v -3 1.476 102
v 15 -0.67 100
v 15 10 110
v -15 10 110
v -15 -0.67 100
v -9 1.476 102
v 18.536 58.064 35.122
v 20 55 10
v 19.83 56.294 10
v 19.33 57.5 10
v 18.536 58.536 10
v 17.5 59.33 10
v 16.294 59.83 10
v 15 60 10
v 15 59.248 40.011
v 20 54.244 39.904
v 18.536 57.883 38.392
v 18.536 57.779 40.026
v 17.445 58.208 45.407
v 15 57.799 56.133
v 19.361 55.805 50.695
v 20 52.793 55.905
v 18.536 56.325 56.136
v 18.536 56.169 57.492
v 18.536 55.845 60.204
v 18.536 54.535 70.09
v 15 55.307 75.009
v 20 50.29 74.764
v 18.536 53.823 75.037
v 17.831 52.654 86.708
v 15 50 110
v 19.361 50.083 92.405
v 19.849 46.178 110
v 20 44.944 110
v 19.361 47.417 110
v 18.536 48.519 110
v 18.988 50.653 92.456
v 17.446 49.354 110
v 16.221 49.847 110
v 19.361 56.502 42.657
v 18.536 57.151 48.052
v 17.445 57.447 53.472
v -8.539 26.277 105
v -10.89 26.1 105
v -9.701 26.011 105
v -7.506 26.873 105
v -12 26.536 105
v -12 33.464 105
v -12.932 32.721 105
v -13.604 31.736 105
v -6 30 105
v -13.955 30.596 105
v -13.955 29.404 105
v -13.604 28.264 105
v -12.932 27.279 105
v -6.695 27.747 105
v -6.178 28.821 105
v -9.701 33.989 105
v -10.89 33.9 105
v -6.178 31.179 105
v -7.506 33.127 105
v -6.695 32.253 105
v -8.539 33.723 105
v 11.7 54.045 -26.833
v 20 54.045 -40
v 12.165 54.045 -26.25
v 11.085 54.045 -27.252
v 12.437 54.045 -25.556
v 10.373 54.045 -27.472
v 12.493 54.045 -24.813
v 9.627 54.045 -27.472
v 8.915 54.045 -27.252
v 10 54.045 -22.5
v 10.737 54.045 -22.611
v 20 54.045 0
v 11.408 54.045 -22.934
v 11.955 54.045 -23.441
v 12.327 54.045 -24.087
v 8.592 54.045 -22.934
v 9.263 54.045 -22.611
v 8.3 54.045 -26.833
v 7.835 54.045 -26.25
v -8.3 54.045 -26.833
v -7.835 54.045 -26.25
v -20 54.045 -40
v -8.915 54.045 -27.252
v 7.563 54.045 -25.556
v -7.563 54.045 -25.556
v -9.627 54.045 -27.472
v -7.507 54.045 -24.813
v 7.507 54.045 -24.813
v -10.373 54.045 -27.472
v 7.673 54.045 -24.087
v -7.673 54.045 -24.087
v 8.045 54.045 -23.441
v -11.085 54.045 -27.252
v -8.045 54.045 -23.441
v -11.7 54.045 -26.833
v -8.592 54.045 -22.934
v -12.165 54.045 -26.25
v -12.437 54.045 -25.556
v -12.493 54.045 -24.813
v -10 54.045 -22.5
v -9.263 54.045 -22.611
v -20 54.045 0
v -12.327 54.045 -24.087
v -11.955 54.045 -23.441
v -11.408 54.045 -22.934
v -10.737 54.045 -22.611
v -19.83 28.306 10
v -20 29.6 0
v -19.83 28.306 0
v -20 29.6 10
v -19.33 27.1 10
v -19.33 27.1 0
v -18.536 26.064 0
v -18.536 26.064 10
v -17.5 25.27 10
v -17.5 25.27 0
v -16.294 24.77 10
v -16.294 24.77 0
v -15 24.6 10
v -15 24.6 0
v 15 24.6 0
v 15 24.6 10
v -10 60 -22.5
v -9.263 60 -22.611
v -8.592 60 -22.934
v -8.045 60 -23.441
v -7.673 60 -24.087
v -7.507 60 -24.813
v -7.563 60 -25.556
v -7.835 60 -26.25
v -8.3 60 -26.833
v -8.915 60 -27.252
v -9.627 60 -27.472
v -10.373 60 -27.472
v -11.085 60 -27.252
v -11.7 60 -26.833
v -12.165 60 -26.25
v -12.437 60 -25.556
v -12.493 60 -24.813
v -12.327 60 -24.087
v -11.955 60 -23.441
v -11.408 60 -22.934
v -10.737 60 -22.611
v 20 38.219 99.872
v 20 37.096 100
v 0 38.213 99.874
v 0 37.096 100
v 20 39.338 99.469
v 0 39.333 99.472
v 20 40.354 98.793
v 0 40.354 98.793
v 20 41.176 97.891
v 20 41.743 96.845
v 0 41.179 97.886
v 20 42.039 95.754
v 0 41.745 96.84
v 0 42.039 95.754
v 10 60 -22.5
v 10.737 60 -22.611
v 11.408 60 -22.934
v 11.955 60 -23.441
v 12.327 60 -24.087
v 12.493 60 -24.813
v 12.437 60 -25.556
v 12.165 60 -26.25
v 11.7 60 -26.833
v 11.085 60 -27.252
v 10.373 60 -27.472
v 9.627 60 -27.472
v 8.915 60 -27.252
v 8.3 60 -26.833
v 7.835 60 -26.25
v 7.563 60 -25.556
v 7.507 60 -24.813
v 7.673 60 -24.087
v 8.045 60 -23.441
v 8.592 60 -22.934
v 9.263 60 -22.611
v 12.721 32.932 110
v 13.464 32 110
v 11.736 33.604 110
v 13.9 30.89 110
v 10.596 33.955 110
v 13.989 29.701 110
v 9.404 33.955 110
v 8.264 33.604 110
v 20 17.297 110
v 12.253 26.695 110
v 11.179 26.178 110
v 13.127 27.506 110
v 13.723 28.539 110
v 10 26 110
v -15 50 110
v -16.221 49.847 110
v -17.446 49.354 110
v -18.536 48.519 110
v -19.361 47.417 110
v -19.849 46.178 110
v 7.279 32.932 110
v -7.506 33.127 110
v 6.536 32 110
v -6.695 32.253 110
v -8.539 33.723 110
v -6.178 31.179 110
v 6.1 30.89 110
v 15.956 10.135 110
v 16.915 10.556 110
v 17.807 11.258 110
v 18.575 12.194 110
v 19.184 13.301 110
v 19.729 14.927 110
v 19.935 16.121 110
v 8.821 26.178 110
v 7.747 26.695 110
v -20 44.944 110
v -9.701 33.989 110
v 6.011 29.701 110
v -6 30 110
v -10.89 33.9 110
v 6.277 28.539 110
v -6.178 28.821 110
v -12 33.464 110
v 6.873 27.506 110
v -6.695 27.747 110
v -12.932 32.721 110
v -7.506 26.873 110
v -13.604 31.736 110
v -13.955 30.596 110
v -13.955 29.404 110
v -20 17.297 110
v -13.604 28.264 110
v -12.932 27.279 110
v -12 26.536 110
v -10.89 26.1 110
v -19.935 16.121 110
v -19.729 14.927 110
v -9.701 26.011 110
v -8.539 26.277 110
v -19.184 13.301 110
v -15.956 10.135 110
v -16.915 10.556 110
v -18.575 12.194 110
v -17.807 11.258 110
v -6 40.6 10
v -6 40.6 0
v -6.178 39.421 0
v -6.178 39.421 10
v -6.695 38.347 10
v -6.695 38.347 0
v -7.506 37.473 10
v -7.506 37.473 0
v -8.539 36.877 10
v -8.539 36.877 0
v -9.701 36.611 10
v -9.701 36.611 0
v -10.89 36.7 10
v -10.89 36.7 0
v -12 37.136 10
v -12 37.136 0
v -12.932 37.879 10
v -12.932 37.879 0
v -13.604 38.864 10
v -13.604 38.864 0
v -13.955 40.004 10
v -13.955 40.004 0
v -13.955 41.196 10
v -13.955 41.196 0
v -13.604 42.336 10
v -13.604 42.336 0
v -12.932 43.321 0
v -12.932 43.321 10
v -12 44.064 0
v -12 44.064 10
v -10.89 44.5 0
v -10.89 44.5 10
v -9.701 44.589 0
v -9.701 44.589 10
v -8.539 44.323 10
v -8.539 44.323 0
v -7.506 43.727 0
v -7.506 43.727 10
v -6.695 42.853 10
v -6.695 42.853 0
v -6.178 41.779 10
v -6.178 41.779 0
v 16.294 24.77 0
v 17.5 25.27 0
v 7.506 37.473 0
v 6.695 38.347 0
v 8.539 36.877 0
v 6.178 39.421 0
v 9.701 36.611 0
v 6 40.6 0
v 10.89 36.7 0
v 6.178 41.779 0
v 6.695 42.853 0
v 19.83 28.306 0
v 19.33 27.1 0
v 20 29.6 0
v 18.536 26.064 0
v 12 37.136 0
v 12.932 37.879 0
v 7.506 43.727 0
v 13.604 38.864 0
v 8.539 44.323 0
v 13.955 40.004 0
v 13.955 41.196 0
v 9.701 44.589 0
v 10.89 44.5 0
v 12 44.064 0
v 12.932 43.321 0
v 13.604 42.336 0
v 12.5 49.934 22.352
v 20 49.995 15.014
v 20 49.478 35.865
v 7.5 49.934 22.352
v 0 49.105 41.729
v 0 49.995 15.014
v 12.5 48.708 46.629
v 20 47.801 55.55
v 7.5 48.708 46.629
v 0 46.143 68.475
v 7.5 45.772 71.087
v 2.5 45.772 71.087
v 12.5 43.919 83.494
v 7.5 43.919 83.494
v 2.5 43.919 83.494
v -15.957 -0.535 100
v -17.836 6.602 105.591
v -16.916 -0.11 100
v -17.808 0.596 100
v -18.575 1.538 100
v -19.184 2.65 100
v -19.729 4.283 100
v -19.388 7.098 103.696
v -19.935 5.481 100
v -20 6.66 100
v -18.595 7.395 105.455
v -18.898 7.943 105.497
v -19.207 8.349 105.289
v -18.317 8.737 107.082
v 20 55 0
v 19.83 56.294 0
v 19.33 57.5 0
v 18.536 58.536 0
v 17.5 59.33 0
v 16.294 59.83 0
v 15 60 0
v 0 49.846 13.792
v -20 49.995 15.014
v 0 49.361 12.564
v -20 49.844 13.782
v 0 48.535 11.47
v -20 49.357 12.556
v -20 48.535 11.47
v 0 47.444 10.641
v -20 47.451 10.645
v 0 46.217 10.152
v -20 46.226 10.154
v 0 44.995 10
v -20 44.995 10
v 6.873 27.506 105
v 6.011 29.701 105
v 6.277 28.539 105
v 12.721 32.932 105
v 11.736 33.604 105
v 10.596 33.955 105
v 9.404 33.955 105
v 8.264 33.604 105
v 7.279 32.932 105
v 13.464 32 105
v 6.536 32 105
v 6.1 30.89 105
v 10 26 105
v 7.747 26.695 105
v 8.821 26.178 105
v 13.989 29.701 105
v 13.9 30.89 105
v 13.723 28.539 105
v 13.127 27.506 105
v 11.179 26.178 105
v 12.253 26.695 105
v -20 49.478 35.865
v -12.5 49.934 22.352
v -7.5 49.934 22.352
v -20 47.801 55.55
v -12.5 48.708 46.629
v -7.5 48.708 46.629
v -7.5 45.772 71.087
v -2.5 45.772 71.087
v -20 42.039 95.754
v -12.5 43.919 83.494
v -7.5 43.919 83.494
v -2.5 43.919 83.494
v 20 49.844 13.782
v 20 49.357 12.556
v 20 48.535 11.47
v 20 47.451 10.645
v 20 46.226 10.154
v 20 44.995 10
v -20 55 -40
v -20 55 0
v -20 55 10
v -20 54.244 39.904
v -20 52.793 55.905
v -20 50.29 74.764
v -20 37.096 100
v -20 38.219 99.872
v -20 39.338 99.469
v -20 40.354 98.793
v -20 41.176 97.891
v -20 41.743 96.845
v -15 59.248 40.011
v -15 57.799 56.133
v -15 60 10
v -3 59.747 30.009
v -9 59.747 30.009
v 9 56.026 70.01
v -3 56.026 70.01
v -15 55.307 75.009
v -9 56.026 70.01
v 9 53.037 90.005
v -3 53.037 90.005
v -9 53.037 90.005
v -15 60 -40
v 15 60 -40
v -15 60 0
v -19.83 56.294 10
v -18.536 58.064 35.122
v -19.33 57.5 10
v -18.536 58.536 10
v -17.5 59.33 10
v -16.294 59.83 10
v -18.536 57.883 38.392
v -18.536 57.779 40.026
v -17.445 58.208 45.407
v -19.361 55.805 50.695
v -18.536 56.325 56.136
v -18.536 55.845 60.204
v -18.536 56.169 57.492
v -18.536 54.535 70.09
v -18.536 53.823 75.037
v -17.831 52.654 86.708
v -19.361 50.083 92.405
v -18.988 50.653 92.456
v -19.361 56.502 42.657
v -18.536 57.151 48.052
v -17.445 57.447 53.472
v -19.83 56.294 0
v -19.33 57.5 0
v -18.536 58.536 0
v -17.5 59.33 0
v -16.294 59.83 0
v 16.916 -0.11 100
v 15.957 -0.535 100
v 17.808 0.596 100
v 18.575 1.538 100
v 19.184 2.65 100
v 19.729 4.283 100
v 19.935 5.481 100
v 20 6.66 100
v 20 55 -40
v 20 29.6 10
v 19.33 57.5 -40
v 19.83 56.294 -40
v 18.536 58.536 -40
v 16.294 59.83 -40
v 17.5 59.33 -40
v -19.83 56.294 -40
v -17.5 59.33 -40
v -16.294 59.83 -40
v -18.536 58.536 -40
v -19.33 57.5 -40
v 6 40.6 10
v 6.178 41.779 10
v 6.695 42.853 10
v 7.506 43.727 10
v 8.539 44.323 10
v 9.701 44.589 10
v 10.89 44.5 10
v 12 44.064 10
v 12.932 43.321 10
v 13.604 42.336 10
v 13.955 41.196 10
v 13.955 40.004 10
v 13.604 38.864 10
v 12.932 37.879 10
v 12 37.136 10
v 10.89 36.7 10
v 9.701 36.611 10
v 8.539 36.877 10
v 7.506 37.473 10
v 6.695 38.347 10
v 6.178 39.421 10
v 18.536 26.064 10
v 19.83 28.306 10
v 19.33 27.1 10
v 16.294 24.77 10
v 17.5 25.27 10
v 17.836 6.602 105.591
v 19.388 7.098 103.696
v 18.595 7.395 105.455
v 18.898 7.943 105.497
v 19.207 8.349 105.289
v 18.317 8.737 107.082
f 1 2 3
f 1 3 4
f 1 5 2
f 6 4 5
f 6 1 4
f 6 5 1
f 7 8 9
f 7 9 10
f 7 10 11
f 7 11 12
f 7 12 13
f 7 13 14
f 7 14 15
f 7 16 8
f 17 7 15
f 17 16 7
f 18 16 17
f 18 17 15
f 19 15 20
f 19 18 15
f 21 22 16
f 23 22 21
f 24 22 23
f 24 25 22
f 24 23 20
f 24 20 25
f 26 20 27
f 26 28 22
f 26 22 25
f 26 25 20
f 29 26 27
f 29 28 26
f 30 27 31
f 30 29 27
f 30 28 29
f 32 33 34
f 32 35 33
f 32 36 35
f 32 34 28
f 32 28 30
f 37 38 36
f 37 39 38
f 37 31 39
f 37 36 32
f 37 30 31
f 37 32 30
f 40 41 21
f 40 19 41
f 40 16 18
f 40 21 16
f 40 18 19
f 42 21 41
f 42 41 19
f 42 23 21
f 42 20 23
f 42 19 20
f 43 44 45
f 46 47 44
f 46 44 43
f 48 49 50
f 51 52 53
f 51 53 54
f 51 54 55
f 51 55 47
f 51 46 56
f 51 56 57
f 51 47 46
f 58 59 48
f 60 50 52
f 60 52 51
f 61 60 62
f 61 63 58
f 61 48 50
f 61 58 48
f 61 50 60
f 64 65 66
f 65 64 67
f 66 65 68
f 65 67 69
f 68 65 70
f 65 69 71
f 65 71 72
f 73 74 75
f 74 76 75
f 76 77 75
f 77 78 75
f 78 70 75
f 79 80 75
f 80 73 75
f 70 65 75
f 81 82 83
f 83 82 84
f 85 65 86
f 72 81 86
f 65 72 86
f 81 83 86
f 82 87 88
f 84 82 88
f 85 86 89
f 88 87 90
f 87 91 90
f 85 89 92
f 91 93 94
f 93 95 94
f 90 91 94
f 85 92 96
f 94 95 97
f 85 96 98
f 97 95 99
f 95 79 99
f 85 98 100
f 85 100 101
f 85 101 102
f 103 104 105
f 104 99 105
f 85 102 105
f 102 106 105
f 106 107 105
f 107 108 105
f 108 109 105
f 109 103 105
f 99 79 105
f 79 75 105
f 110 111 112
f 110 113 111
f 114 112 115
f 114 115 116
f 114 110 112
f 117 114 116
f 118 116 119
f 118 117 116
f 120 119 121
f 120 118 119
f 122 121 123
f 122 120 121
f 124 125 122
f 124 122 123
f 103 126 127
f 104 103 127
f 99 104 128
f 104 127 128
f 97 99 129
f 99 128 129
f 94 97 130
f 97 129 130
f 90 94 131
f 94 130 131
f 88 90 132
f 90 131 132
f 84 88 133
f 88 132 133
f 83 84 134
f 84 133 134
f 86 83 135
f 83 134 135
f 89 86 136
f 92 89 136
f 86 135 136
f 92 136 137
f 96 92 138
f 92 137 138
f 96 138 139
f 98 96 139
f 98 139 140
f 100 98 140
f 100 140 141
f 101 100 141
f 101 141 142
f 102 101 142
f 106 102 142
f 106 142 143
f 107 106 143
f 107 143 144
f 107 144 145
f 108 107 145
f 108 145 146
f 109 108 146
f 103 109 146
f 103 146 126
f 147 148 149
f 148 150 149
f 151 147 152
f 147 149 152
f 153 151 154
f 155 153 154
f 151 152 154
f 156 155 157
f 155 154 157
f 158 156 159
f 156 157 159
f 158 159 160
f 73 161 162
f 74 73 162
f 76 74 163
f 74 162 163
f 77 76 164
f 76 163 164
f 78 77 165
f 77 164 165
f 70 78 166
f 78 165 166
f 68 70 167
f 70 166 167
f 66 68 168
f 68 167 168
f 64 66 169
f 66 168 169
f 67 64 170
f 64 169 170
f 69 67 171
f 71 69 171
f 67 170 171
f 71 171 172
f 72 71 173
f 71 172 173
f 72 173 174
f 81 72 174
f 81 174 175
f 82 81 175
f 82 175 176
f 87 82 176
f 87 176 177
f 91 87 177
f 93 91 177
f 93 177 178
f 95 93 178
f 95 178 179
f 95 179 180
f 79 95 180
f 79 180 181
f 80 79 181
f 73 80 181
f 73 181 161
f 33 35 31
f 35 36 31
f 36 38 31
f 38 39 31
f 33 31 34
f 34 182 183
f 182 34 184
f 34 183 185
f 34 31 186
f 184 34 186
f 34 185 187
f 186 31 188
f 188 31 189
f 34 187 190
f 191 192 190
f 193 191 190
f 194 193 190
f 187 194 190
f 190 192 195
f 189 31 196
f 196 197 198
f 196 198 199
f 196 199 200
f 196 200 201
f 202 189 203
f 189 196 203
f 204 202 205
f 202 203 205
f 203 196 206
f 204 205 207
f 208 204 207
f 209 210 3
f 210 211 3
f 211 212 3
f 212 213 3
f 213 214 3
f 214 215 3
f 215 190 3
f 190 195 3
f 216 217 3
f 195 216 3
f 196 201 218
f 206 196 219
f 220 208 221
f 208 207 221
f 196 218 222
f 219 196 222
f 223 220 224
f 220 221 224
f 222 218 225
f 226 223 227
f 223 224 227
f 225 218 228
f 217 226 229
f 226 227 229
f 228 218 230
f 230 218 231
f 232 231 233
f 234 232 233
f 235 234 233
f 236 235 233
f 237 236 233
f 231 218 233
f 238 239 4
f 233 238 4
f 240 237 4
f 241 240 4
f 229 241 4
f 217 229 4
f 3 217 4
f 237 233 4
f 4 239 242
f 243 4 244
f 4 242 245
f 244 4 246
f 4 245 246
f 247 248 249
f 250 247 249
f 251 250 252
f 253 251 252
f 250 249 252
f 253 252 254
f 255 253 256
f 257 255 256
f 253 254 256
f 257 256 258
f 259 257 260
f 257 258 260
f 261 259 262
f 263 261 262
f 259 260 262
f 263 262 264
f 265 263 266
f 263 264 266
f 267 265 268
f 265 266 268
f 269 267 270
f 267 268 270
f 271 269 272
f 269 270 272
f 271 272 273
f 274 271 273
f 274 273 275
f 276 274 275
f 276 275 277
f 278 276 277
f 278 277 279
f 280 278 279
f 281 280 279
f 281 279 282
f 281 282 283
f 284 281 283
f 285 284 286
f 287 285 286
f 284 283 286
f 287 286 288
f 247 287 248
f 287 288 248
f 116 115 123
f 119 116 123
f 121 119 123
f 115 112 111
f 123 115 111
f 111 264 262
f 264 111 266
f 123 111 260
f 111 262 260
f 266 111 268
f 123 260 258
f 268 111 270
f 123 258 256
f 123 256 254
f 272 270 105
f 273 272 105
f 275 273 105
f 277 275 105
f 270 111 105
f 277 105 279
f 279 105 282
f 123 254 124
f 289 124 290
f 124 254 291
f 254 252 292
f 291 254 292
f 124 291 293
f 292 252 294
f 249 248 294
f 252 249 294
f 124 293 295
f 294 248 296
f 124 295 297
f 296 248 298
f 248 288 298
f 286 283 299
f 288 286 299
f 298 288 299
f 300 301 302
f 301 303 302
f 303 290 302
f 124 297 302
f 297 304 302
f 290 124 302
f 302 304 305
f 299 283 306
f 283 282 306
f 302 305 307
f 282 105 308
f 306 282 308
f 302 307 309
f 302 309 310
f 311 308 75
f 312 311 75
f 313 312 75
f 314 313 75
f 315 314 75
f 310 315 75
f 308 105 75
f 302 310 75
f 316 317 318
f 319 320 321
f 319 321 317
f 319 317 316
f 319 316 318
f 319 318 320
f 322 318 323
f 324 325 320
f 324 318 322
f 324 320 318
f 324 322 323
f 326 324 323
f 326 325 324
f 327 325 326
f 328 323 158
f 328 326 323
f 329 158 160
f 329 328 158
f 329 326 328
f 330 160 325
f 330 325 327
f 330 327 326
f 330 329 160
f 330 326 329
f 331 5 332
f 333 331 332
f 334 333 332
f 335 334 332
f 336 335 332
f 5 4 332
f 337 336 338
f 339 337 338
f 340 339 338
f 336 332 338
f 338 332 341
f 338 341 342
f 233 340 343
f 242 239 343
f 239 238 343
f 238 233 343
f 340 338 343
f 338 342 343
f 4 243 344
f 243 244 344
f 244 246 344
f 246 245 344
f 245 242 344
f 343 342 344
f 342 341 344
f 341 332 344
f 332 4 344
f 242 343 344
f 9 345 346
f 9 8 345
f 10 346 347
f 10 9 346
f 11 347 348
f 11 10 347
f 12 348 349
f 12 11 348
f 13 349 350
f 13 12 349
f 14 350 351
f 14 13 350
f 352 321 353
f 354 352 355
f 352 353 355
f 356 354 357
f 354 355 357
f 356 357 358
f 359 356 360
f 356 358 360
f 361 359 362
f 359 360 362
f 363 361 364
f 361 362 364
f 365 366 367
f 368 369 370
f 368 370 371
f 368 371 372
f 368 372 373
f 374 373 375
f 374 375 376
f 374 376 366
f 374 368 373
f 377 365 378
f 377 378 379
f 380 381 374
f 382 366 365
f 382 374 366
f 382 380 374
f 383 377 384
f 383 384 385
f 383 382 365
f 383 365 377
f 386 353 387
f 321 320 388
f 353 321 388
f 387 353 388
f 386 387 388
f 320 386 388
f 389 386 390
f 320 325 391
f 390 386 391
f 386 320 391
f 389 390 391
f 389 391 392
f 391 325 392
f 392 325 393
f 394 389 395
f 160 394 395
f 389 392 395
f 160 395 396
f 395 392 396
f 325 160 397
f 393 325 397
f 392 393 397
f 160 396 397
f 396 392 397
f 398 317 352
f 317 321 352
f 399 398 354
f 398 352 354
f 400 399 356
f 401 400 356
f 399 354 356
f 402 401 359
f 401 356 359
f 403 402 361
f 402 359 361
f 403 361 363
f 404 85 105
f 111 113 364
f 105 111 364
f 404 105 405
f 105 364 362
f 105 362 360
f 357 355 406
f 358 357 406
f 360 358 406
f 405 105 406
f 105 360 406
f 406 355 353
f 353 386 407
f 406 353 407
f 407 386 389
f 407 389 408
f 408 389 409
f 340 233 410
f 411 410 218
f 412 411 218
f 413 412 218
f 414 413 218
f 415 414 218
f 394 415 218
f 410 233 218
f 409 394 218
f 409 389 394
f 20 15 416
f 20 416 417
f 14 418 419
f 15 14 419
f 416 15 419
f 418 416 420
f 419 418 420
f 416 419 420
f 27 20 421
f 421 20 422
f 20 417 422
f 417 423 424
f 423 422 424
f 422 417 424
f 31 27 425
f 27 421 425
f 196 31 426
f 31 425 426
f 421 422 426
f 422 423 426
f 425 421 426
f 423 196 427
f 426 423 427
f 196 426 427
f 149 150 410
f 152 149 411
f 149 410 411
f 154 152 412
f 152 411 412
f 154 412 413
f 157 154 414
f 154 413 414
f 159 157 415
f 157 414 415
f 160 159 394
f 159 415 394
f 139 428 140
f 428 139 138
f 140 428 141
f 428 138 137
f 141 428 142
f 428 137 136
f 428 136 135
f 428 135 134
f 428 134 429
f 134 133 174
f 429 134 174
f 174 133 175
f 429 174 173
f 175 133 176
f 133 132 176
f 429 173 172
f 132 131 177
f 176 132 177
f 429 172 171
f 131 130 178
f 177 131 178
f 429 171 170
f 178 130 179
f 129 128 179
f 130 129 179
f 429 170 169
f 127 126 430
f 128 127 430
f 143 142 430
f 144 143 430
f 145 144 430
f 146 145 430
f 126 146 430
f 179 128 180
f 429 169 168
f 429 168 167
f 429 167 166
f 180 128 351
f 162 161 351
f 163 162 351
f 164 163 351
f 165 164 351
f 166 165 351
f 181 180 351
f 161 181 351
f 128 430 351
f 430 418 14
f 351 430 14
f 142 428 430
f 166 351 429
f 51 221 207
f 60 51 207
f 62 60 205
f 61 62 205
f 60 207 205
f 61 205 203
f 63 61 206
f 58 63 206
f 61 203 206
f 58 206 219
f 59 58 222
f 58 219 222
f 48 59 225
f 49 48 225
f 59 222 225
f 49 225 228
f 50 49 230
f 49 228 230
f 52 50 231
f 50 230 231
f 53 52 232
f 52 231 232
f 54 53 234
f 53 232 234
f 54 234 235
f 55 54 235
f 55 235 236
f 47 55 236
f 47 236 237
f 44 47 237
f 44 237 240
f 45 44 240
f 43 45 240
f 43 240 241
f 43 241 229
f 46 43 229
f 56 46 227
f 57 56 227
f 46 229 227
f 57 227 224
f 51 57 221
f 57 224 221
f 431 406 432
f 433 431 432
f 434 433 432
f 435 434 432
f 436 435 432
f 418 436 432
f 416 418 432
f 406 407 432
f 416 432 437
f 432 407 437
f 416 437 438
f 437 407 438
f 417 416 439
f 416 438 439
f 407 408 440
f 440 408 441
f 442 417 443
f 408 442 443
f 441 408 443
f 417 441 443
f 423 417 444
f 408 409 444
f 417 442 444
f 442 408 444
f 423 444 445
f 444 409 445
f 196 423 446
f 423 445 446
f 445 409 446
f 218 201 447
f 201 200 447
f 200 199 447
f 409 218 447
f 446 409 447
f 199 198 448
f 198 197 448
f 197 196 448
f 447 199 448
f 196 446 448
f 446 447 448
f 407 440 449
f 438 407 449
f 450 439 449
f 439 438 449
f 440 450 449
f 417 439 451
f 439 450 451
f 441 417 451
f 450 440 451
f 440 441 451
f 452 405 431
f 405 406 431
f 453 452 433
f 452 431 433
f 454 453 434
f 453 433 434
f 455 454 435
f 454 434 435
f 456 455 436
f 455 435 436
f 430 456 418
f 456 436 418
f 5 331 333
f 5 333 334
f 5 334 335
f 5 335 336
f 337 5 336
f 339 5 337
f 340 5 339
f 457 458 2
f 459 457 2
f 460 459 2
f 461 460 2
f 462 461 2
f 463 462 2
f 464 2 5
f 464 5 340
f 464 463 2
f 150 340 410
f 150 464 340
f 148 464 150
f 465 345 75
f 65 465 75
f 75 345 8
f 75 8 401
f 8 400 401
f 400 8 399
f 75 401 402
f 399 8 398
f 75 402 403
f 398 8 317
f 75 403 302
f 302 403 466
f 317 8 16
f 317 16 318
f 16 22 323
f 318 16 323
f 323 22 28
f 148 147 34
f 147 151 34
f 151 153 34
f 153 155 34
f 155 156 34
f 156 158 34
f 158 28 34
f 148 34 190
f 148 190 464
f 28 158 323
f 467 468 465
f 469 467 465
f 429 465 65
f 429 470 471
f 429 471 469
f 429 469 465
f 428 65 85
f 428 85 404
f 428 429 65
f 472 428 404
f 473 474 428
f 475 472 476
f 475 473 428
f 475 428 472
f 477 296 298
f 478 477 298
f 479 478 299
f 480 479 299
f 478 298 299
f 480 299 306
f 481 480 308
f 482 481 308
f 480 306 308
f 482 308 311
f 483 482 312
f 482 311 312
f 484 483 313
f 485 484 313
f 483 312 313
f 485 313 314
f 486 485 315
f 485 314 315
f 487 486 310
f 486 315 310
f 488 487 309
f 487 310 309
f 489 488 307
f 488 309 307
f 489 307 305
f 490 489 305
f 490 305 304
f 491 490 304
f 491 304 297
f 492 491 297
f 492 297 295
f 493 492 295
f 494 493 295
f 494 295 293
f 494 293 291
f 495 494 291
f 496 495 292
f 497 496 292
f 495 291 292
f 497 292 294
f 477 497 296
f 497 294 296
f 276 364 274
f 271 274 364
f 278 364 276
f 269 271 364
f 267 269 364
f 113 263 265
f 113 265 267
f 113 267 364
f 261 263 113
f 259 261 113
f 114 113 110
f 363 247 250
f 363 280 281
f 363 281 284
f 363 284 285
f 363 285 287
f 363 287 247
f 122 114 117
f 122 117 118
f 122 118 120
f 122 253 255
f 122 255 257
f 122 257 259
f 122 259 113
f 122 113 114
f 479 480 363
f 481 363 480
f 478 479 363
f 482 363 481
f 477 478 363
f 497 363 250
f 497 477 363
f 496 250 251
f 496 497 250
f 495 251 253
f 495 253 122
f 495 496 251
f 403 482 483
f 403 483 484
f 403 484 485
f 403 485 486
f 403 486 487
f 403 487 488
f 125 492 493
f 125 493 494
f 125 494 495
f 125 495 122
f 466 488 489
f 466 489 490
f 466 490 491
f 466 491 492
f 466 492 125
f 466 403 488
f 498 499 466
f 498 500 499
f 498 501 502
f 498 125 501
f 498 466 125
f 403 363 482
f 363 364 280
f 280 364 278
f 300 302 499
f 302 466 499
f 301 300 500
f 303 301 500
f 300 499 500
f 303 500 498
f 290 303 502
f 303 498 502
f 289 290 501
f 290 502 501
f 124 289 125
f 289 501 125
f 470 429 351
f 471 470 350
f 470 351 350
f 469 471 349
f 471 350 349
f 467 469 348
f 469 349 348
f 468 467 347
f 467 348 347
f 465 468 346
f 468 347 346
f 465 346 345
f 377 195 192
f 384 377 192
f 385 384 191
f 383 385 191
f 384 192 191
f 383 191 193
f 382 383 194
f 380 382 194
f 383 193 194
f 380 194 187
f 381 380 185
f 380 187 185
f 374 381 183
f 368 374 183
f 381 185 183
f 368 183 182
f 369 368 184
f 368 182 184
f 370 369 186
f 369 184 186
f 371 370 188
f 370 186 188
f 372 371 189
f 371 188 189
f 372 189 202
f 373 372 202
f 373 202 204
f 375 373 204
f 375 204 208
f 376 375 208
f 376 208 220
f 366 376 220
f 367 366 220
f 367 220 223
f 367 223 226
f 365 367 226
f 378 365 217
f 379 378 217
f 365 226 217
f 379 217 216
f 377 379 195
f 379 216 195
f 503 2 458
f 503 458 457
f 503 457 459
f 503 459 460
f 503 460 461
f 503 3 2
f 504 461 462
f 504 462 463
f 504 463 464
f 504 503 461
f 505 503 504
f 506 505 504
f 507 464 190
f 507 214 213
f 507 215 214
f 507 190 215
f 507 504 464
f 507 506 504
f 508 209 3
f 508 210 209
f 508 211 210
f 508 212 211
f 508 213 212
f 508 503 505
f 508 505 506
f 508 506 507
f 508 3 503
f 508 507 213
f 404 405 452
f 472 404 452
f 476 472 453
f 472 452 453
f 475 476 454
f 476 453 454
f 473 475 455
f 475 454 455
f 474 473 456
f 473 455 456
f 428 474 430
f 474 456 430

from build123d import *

# Parameters (mm, degrees)
SKETCH1_W           = 40
SKETCH1_H           = 120
BOSS_EXTRUDE1_DEPTH = 10
LOFT1_START         = -20
LOFT1_DEPTH         = 40
CUT_EXTRUDE2_DEPTH  = 109
FILLET2_R           = 5
SKETCH7_R           = 4
CUT_EXTRUDE3_DEPTH  = 5
SKETCH8_R           = 4
CUT_EXTRUDE4_DEPTH  = 10
FILLET4_R           = 5
BOSS_EXTRUDE3_DEPTH = 40
SKETCH10_R          = 2.5
CUT_EXTRUDE5_DEPTH  = 10


# Read off the part's stored shape, not the designer's step: Loft1
with BuildPart() as part:
    # Sketch1 → Boss-Extrude1 (new body)
    with BuildSketch(Plane.XY):
        Rectangle(SKETCH1_W, SKETCH1_H)
    extrude(amount=BOSS_EXTRUDE1_DEPTH)

    # Loft1 outline → Loft1 (add)
    with BuildSketch(Plane.YZ.offset(LOFT1_START)):
        with BuildLine():
            add(Edge.make_bspline(
                [(-60, 10), (-60, 30.441311123), (-60, 50.882622246), (-32, 70.441311123), (-11, 90.220655562), (10, 110)],
                knots=[0, 0, 0, 0, 0, 0, 1, 1, 1, 1, 1, 1], degree=5))
            Line((-60, 10), (60, 10))
            add(Edge.make_bspline(
                [(60, 10), (60, 30.009975124), (60, 50.019950248), (56, 70.009975124), (53, 90.004987562), (50, 110)],
                knots=[0, 0, 0, 0, 0, 0, 1, 1, 1, 1, 1, 1], degree=5))
            Line((50, 110), (10, 110))
        make_face()
    extrude(amount=LOFT1_DEPTH)

    # Sketch5 → Cut-Extrude2 (cut, symmetric)
    with BuildSketch(Plane(origin=(0, 0, 0), x_dir=(0, 0, -1), z_dir=(1, 0, 0))):
        with BuildLine():
            Line((0, -60), (-100, -60))
            Line((-100, -60), (-100, 41.393396846))
            add(Edge.make_bspline(
                [(-10, 50), (-14.168744818, 50), (-18.275601874, 49.996409138), (-26.428009759, 49.87077255), (-30.473567498, 49.749630948), (-38.552130932, 49.347381325), (-42.585186542, 49.066850503), (-50.67278015, 48.349847693), (-54.727313877, 47.913843652), (-62.876208691, 46.920588729), (-66.970526782, 46.363844017), (-75.202509115, 45.180338869), (-79.340154976, 44.554169827), (-87.648626866, 43.2832223), (-91.819473021, 42.639096286), (-97.329708937, 41.798417087), (-98.664929704, 41.595568065), (-100, 41.393396846)],
                knots=[0, 0, 0, 0, 0.125, 0.125, 0.25, 0.25, 0.375, 0.375, 0.5, 0.5, 0.625, 0.625, 0.75, 0.75, 0.875, 0.875, 0.914957714, 0.914957714, 0.914957714, 0.914957714], degree=3))
            Line((-10, 50), (-10, 24.6))
            Line((-10, 24.6), (0, 24.6))
            Line((0, 24.6), (0, -60))
        make_face()
    extrude(amount=CUT_EXTRUDE2_DEPTH, both=True, mode=Mode.SUBTRACT)

    # Fillet2
    fillet2_edges = [part.edges().sort_by_distance(p)[0] for p in [
        (20, 60, 5),
        (-20, 60, 5),
        (20, 4.6735266, 104.990679985),
        (-20, 4.6735266, 104.990679985),
        (-20, 57.319131326, 60.213292337),
        (20, 57.319131326, 60.213292337),
    ]]
    fillet(fillet2_edges, radius=FILLET2_R)

    # Sketch7 → Cut-Extrude3 (cut)
    with BuildSketch(Plane.XY.offset(110)):
        with Locations((-10, 30)):
            Circle(SKETCH7_R)
        with Locations(Location((10, 30, 0), (0, 0, 270))):
            Circle(SKETCH7_R)
        with Locations((10, -30)):
            Circle(SKETCH7_R)
        with Locations((-10, -30)):
            Circle(SKETCH7_R)
    extrude(amount=-CUT_EXTRUDE3_DEPTH, mode=Mode.SUBTRACT)

    # Sketch8 → Cut-Extrude4 (cut)
    with BuildSketch(Plane(origin=(0, 0, 0), x_dir=(-1, 0, 0), z_dir=(0, 0, -1))):
        with Locations((-10, 40.6)):
            Circle(SKETCH8_R)
        with Locations(Location((10, 40.6, 0), (0, 0, 180))):
            Circle(SKETCH8_R)
    extrude(amount=-CUT_EXTRUDE4_DEPTH, mode=Mode.SUBTRACT)

    # Fillet4
    fillet4_edges = [part.edges().sort_by_distance(p)[0] for p in [
        (-20, 24.6, 5),
        (20, 24.6, 5),
        (-10, 50, 10),
        (-10, 41.393396846, 100),
    ]]
    fillet(fillet4_edges, radius=FILLET4_R)

    # Sketch9 → Boss-Extrude3 (add)
    with BuildSketch(Plane(origin=(0, 0, 0), x_dir=(-1, 0, 0), z_dir=(0, 0, -1))):
        with BuildLine():
            Line((-20, 55), (-20, 54.045))
            Line((-20, 54.045), (20, 54.045))
            Line((20, 54.045), (20, 55))
            ThreePointArc((20, 55), (18.535533906, 58.535533906), (15, 60))
            Line((15, 60), (-15, 60))
            ThreePointArc((-15, 60), (-18.535533906, 58.535533906), (-20, 55))
        make_face()
    extrude(amount=BOSS_EXTRUDE3_DEPTH)

    # Sketch10 → Cut-Extrude5 (cut)
    with BuildSketch(Plane(origin=(0, 60, 0), x_dir=(1, 0, 0), z_dir=(0, 1, 0))):
        with Locations(Location((-10, 25, 0), (0, 0, 270))):
            Circle(SKETCH10_R)
        with Locations(Location((10, 25, 0), (0, 0, 270))):
            Circle(SKETCH10_R)
    extrude(amount=-CUT_EXTRUDE5_DEPTH, mode=Mode.SUBTRACT)


solid = part.part
